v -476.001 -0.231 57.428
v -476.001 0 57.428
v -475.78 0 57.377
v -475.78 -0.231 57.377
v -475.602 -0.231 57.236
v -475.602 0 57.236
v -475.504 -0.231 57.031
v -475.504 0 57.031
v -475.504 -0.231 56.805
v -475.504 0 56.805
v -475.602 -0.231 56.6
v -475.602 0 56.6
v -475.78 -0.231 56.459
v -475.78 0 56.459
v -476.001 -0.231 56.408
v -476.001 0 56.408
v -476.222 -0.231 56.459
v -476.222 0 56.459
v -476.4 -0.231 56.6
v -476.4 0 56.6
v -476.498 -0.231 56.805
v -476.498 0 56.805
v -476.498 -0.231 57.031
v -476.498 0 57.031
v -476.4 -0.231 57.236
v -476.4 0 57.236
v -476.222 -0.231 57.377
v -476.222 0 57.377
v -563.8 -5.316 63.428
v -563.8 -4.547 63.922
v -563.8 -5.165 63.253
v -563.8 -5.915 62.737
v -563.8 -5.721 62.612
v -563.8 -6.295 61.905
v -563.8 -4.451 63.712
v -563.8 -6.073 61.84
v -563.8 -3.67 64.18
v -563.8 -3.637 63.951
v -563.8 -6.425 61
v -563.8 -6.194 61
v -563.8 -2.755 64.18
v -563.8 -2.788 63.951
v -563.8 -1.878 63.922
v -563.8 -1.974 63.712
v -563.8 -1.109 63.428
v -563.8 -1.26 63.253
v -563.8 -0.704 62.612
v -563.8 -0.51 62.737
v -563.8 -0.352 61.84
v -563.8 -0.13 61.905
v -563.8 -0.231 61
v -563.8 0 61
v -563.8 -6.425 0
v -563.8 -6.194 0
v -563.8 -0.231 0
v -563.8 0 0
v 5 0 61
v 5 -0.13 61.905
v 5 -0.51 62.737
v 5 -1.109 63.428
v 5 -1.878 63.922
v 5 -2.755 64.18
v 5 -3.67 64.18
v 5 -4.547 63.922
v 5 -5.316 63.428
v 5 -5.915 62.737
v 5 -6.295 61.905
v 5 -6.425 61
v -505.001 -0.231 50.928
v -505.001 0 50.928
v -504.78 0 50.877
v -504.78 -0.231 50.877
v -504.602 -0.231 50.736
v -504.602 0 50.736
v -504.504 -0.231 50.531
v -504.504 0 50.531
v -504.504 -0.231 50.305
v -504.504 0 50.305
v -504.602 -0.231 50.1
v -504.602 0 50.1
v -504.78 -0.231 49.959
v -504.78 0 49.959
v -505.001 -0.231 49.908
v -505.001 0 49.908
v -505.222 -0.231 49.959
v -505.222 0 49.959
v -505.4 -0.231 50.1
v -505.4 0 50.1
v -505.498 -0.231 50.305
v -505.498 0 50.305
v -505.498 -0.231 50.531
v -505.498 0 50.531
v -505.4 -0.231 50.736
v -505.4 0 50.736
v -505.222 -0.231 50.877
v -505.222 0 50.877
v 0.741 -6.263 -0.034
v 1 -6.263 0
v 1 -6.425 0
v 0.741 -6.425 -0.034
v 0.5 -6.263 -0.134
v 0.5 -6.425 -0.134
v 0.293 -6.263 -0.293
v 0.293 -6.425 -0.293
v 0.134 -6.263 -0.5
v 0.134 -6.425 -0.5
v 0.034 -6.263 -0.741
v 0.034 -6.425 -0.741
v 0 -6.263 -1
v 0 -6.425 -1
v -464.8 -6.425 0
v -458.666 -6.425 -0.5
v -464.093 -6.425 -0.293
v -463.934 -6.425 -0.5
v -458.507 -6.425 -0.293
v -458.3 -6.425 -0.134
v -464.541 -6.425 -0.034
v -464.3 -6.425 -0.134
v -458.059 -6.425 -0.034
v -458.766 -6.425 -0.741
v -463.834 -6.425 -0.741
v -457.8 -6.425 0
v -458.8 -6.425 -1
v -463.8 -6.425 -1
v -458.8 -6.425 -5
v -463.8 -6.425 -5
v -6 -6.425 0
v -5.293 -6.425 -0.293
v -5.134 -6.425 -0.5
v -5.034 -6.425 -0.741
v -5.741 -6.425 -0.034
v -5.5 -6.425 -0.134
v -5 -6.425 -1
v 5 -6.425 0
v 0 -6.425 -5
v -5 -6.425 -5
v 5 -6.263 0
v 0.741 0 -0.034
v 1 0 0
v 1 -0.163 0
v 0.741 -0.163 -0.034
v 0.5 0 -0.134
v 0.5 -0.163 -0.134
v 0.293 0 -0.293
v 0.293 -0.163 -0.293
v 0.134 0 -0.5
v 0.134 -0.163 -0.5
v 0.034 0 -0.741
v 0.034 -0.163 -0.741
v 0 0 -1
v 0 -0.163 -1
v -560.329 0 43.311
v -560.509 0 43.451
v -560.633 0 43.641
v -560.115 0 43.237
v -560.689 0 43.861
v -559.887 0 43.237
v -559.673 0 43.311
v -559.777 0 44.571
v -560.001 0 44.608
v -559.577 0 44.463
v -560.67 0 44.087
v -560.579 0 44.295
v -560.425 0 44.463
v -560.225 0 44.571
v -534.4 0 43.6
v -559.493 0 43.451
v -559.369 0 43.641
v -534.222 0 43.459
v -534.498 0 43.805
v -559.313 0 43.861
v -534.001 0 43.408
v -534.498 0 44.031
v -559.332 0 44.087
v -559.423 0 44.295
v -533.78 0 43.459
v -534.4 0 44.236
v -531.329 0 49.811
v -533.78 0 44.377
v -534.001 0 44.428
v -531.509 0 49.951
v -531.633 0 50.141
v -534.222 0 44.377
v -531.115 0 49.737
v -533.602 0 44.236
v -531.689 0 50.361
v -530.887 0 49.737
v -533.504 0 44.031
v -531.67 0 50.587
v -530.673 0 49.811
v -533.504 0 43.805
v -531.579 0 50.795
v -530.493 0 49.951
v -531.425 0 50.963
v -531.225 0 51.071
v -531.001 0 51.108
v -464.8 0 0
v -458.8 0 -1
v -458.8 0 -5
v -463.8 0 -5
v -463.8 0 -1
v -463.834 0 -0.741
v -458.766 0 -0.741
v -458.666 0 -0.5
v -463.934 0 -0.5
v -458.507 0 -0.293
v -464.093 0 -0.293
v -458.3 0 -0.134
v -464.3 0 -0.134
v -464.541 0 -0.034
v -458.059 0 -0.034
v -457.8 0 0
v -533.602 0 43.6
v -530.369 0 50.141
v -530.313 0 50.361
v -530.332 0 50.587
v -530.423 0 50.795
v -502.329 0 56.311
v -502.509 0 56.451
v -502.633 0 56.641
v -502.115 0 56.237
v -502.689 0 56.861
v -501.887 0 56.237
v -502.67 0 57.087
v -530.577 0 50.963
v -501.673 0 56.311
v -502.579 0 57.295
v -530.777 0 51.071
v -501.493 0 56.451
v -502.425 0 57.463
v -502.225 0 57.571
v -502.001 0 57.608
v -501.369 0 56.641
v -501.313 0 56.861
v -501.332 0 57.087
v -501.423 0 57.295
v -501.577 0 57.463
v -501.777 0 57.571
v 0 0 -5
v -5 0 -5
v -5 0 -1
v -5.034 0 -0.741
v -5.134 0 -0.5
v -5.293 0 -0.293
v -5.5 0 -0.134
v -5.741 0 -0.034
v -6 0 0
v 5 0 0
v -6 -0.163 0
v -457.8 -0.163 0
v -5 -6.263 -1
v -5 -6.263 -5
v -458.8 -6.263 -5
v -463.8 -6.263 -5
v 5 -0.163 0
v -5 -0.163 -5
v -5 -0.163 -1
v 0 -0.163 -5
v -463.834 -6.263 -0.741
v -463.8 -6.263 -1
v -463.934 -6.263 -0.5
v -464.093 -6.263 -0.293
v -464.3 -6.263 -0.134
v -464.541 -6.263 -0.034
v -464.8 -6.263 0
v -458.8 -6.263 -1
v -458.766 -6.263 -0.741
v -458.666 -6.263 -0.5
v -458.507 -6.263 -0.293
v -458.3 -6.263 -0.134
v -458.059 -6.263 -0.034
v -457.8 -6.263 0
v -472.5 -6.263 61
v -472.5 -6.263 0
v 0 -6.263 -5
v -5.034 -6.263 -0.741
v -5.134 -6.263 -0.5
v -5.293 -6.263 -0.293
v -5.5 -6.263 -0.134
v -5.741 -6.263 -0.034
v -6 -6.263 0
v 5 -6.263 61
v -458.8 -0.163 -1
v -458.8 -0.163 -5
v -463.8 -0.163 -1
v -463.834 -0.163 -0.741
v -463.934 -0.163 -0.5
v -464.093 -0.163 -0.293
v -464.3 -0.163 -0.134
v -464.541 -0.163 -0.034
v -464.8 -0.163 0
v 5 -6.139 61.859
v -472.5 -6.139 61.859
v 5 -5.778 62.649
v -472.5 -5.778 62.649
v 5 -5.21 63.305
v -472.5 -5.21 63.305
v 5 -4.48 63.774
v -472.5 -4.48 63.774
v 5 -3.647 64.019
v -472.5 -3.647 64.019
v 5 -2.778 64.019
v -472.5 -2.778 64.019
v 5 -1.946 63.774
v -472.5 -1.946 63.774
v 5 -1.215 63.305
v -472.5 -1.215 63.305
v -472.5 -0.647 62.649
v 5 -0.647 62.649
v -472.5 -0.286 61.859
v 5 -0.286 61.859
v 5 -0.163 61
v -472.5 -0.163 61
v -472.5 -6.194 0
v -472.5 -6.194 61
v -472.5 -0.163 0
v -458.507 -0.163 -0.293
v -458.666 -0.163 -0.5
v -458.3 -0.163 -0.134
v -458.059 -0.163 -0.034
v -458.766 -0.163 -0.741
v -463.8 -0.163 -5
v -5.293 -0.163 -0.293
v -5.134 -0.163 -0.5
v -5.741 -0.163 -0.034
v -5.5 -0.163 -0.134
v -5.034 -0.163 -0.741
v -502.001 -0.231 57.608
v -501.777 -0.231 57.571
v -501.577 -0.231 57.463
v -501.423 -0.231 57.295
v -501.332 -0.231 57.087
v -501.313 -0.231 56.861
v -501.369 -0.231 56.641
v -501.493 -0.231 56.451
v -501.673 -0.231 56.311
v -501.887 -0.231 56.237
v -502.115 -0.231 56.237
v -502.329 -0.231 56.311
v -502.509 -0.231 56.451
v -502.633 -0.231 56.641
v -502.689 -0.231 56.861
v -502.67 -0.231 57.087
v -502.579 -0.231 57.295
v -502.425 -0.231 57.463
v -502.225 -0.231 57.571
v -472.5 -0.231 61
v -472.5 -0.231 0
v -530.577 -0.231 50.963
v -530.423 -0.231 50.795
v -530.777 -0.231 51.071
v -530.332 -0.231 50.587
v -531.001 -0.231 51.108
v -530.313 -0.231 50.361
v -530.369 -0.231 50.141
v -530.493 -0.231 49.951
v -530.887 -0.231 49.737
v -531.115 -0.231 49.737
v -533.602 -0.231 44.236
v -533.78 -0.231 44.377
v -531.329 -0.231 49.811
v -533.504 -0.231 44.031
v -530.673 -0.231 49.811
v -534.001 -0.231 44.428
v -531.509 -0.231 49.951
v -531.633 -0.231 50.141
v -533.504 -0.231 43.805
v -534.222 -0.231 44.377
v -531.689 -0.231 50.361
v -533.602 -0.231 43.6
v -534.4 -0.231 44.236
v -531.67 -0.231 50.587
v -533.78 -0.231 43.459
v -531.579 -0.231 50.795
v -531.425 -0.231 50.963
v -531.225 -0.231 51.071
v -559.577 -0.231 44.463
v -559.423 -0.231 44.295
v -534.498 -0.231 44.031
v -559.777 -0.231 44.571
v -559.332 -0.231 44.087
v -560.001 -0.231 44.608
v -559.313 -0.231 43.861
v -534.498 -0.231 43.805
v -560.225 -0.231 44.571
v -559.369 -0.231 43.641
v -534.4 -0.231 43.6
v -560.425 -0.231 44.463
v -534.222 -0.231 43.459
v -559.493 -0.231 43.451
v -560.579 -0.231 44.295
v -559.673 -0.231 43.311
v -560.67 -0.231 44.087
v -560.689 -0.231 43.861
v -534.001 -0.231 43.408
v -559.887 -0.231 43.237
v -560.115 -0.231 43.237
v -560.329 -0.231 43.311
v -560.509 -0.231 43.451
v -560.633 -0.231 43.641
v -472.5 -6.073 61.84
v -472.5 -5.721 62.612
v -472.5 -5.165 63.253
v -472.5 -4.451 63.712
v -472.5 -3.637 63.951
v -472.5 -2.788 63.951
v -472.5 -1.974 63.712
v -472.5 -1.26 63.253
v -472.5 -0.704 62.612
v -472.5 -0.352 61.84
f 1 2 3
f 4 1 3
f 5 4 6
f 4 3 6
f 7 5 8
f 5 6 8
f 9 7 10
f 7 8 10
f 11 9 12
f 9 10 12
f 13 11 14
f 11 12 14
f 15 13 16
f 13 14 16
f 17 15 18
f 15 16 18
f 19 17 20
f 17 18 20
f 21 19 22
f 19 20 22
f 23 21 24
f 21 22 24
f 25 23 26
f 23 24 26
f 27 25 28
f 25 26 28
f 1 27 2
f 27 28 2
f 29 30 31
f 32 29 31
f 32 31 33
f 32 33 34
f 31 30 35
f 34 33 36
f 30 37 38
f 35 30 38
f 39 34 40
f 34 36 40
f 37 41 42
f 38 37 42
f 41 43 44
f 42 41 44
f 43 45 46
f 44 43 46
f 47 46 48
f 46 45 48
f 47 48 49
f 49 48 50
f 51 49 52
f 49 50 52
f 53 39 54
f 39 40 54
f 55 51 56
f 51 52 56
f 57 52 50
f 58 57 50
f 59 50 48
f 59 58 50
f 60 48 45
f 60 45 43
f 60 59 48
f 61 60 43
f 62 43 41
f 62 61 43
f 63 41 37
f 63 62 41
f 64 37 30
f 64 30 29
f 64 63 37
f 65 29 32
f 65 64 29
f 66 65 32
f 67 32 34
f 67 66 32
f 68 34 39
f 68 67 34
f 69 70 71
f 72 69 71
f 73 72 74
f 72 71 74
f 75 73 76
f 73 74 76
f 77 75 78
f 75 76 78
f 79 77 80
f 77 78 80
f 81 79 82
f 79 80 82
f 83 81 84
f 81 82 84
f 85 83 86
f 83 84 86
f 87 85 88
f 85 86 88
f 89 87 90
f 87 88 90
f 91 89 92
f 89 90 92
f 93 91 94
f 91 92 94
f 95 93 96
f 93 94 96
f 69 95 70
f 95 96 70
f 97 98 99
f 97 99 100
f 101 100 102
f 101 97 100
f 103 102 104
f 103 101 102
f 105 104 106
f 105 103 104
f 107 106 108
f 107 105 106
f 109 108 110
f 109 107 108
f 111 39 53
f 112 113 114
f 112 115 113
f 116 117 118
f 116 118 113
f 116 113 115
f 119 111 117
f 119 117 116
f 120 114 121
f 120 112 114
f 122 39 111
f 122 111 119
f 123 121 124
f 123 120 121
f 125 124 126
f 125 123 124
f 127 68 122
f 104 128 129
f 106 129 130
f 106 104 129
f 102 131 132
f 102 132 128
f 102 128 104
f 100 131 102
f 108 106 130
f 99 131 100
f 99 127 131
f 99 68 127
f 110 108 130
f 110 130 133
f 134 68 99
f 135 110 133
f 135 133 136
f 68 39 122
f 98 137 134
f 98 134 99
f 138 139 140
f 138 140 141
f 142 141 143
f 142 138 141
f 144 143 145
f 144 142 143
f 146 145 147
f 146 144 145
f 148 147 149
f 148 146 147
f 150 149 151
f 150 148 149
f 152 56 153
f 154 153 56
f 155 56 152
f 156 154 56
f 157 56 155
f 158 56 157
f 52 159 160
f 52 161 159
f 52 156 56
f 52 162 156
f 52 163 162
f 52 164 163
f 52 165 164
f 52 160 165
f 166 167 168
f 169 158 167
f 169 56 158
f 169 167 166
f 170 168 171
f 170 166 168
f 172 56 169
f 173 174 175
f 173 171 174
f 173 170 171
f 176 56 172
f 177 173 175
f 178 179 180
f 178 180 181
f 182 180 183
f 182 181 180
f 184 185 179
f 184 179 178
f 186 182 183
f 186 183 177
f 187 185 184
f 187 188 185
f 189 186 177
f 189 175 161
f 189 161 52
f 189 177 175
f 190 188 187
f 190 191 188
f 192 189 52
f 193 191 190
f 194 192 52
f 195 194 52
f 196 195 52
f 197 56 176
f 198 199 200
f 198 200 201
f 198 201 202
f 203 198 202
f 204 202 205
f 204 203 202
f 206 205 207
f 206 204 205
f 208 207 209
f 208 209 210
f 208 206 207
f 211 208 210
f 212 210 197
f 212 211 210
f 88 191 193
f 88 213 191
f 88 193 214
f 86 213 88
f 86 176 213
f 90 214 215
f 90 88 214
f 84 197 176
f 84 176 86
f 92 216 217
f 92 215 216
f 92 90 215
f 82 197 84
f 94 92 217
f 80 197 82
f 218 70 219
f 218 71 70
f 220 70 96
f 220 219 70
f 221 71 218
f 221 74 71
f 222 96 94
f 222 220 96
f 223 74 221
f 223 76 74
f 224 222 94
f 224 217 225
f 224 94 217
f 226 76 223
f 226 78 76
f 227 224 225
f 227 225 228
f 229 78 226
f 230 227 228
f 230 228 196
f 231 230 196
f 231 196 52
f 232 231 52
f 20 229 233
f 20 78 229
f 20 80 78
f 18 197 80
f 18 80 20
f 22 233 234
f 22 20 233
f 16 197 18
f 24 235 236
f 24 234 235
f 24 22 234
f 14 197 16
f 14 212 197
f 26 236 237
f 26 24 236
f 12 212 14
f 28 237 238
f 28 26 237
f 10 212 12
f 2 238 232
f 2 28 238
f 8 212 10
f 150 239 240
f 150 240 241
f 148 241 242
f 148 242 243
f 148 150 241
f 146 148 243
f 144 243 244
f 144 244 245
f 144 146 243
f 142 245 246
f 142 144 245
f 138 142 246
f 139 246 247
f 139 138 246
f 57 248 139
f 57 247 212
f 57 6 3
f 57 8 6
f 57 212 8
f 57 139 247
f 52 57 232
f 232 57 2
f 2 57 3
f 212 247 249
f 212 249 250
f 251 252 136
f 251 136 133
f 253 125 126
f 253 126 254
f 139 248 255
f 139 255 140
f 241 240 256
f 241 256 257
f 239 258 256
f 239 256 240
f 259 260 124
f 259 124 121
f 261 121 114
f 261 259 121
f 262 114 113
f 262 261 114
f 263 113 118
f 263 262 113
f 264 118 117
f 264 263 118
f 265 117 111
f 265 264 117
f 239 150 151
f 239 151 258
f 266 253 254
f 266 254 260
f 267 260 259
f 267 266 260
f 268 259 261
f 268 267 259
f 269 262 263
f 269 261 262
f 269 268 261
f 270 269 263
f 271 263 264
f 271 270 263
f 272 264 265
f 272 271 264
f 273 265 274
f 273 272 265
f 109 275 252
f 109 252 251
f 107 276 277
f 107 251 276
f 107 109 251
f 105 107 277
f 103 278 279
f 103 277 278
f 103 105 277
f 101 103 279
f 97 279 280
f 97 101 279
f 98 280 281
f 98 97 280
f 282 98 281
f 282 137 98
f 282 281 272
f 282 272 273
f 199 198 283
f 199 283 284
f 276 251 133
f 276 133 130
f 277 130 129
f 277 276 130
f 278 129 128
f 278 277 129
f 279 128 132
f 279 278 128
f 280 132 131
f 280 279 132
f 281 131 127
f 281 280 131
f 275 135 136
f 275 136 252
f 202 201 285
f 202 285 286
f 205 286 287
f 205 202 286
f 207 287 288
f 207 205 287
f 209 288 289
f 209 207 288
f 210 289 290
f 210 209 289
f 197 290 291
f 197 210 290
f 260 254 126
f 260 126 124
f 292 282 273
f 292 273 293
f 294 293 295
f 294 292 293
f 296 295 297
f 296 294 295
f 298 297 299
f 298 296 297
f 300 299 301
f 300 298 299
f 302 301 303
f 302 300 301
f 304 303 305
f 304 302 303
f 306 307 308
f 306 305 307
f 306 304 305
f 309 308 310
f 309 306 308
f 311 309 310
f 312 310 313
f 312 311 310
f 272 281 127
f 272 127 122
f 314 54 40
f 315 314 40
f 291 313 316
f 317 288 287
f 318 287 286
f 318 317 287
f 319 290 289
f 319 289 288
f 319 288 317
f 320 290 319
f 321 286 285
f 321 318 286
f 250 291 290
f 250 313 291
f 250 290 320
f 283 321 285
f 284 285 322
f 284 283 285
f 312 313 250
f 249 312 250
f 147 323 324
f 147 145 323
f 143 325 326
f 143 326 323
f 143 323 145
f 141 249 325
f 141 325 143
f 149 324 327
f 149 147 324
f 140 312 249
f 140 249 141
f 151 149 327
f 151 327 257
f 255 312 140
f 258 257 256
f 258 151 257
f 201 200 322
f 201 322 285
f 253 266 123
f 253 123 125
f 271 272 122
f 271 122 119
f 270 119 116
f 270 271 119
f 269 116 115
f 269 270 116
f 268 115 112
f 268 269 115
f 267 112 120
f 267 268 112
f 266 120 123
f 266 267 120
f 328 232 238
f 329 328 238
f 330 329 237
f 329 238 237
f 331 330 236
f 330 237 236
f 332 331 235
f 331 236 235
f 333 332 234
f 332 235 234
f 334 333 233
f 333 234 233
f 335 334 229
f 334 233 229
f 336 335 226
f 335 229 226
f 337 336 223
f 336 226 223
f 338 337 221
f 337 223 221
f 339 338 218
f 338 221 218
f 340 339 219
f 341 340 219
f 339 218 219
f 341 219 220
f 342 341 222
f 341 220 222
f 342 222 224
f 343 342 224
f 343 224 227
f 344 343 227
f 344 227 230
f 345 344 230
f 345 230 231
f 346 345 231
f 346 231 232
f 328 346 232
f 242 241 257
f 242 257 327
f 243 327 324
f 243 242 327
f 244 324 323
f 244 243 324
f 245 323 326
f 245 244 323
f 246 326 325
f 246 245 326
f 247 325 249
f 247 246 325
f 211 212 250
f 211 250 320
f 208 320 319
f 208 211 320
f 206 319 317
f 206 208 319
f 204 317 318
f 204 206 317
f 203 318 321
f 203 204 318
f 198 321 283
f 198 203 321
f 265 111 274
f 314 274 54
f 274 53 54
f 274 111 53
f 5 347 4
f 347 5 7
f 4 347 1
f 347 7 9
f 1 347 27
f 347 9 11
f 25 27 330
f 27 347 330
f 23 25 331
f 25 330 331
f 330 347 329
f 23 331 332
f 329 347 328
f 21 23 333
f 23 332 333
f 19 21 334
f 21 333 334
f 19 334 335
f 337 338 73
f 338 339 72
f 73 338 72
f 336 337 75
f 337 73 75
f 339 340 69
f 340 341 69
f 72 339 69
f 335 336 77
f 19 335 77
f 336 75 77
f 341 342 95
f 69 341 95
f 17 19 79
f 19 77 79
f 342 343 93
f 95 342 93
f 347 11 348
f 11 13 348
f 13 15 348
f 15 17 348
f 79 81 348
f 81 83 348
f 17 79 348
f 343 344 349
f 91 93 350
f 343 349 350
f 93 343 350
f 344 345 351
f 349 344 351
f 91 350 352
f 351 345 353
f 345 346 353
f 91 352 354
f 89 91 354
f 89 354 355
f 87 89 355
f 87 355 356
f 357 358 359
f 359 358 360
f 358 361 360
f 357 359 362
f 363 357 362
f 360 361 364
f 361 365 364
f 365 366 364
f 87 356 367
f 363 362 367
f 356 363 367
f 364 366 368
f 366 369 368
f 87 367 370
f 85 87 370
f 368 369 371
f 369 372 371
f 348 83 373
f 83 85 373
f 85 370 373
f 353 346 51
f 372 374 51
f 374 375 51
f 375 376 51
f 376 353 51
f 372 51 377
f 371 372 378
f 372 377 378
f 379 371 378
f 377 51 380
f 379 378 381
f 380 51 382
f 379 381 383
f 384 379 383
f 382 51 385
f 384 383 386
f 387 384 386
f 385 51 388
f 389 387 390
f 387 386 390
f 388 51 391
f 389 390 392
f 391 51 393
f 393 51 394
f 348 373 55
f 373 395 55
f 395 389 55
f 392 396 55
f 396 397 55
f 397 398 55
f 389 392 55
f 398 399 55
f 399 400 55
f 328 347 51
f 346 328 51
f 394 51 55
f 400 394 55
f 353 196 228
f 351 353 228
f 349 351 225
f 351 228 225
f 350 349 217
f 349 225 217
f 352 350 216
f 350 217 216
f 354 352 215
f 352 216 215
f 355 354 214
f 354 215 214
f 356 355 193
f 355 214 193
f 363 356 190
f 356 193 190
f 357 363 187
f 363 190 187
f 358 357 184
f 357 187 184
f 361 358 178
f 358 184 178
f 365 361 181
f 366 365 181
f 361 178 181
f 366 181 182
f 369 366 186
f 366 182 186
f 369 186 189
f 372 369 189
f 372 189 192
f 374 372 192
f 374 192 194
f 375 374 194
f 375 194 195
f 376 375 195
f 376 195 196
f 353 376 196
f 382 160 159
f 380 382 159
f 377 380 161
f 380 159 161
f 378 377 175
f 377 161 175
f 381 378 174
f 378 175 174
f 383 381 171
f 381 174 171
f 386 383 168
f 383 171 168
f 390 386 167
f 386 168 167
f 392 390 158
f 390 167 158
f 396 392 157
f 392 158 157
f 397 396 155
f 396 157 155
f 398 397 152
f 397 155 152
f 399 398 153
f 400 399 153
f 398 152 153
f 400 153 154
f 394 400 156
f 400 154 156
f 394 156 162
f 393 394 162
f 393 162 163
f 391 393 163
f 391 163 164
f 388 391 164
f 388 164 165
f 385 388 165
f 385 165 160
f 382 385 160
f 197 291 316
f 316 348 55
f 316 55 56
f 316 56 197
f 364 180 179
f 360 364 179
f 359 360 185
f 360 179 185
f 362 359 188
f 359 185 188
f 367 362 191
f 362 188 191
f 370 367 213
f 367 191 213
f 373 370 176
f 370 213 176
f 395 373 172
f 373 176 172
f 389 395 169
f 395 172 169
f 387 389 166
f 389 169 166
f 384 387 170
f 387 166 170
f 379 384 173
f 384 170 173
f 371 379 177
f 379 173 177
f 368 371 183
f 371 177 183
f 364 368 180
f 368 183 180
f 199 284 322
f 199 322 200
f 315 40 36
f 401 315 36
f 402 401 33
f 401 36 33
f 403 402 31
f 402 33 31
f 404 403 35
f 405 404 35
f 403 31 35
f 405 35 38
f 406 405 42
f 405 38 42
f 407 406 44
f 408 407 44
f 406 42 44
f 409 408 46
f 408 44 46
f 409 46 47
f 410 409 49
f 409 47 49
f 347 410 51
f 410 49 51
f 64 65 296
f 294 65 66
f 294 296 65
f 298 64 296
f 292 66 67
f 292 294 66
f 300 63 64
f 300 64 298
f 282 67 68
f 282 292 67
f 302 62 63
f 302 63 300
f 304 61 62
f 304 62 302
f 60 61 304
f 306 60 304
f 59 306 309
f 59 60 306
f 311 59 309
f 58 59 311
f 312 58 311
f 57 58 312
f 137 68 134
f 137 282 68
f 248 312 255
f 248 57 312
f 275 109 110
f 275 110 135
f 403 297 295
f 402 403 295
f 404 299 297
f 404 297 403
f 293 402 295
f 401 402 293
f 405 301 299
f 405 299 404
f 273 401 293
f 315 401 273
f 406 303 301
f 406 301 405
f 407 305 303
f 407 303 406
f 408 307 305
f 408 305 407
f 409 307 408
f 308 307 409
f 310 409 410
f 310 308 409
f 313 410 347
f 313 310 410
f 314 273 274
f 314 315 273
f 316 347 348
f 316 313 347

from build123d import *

# Parameters (mm, degrees)
BOSS_EXTRUDE1_DEPTH      = 5
BOSS_EXTRUDE1_DEPTH_BACK = 563.8
CUT_EXTRUDE1_DEPTH       = 7.42512
BOSS_EXTRUDE2_DEPTH      = 91.3
SKETCH4_R                = 0.69
SKETCH4_R_2              = 0.51
CUT_EXTRUDE2_DEPTH       = 2


with BuildPart() as part:
    # Sketch1 → Boss-Extrude1 (new body, two sides)
    with BuildSketch(Plane(origin=(0, 0, 0), x_dir=(0, 0, -1), z_dir=(1, 0, 0))) as boss_extrude1_sk:
        with BuildLine():
            Line((0, 0), (-61, 0))
            ThreePointArc((-61, 0), (-64.21256, -3.21256), (-61, -6.42512))
            Line((-61, -6.42512), (0, -6.42512))
            Line((0, -6.42512), (5, -6.42512))
            Line((5, -6.42512), (5, -6.26256))
            Line((5, -6.26256), (-61, -6.26256))
            ThreePointArc((-61, -6.26256), (-64.05, -3.21256), (-61, -0.16256))
            Line((-61, -0.16256), (5, -0.16256))
            Line((5, -0.16256), (5, 0))
            Line((5, 0), (0, 0))
        make_face()
    extrude(amount=BOSS_EXTRUDE1_DEPTH)
    extrude(boss_extrude1_sk.sketch, amount=-BOSS_EXTRUDE1_DEPTH_BACK)

    # Sketch2 → Cut-Extrude1 (cut, through all)
    with BuildSketch(Plane(origin=(0, 0, 0), x_dir=(1, 0, 0), z_dir=(0, 1, 0))):
        with BuildLine():
            Line((5, 0), (1, 0))
            ThreePointArc((1, 0), (0.292893219, 0.292893219), (0, 1))
            Line((0, 1), (0, 5))
            Line((0, 5), (-5, 5))
            Line((-5, 5), (-5, 1))
            ThreePointArc((-5, 1), (-5.292893219, 0.292893219), (-6, 0))
            Line((-6, 0), (-457.8, 0))
            ThreePointArc((-457.8, 0), (-458.507106781, 0.292893219), (-458.8, 1))
            Line((-458.8, 1), (-458.8, 5))
            Line((-458.8, 5), (-463.8, 5))
            Line((-463.8, 5), (-463.8, 1))
            ThreePointArc((-463.8, 1), (-464.092893219, 0.292893219), (-464.8, 0))
            Line((-464.8, 0), (-563.8, 0))
            Line((-563.8, 0), (-563.8, 10))
            Line((-563.8, 10), (5, 10))
            Line((5, 10), (5, 0))
        make_face()
    extrude(amount=-CUT_EXTRUDE1_DEPTH, mode=Mode.SUBTRACT)

    # Sketch3 → Boss-Extrude2 (add)
    with BuildSketch(Plane.ZY.offset(563.8)):
        with BuildLine():
            Line((61, -0.23114), (0, -0.23114))
            Line((0, -0.23114), (0, 0))
            Line((0, 0), (61, 0))
            ThreePointArc((61, 0), (64.21256, -3.21256), (61, -6.42512))
            Line((61, -6.42512), (0, -6.42512))
            Line((0, -6.42512), (0, -6.19398))
            Line((0, -6.19398), (61, -6.19398))
            ThreePointArc((61, -6.19398), (63.98142, -3.21256), (61, -0.23114))
        make_face()
    extrude(amount=-BOSS_EXTRUDE2_DEPTH)

    # Sketch4 → Cut-Extrude2 (cut)
    with BuildSketch(Plane(origin=(0, 0, 0), x_dir=(1, 0, 0), z_dir=(0, 1, 0))):
        with Locations(Location((-560.001, -43.918, 0), (0, 0, 270))):  # turned: the seam where the file's is
            Circle(SKETCH4_R)
        with Locations(Location((-534.001, -43.918, 0), (0, 0, 270))):  # turned: the seam where the file's is
            Circle(SKETCH4_R_2)
        with Locations(Location((-531.001, -50.418, 0), (0, 0, 270))):  # turned: the seam where the file's is
            Circle(SKETCH4_R)
        with Locations(Location((-505.001, -50.418, 0), (0, 0, 270))):  # turned: the seam where the file's is
            Circle(SKETCH4_R_2)
        with Locations(Location((-502.001, -56.918, 0), (0, 0, 270))):  # turned: the seam where the file's is
            Circle(SKETCH4_R)
        with Locations(Location((-476.001, -56.918, 0), (0, 0, 270))):  # turned: the seam where the file's is
            Circle(SKETCH4_R_2)
    extrude(amount=-CUT_EXTRUDE2_DEPTH, mode=Mode.SUBTRACT)


solid = part.part
